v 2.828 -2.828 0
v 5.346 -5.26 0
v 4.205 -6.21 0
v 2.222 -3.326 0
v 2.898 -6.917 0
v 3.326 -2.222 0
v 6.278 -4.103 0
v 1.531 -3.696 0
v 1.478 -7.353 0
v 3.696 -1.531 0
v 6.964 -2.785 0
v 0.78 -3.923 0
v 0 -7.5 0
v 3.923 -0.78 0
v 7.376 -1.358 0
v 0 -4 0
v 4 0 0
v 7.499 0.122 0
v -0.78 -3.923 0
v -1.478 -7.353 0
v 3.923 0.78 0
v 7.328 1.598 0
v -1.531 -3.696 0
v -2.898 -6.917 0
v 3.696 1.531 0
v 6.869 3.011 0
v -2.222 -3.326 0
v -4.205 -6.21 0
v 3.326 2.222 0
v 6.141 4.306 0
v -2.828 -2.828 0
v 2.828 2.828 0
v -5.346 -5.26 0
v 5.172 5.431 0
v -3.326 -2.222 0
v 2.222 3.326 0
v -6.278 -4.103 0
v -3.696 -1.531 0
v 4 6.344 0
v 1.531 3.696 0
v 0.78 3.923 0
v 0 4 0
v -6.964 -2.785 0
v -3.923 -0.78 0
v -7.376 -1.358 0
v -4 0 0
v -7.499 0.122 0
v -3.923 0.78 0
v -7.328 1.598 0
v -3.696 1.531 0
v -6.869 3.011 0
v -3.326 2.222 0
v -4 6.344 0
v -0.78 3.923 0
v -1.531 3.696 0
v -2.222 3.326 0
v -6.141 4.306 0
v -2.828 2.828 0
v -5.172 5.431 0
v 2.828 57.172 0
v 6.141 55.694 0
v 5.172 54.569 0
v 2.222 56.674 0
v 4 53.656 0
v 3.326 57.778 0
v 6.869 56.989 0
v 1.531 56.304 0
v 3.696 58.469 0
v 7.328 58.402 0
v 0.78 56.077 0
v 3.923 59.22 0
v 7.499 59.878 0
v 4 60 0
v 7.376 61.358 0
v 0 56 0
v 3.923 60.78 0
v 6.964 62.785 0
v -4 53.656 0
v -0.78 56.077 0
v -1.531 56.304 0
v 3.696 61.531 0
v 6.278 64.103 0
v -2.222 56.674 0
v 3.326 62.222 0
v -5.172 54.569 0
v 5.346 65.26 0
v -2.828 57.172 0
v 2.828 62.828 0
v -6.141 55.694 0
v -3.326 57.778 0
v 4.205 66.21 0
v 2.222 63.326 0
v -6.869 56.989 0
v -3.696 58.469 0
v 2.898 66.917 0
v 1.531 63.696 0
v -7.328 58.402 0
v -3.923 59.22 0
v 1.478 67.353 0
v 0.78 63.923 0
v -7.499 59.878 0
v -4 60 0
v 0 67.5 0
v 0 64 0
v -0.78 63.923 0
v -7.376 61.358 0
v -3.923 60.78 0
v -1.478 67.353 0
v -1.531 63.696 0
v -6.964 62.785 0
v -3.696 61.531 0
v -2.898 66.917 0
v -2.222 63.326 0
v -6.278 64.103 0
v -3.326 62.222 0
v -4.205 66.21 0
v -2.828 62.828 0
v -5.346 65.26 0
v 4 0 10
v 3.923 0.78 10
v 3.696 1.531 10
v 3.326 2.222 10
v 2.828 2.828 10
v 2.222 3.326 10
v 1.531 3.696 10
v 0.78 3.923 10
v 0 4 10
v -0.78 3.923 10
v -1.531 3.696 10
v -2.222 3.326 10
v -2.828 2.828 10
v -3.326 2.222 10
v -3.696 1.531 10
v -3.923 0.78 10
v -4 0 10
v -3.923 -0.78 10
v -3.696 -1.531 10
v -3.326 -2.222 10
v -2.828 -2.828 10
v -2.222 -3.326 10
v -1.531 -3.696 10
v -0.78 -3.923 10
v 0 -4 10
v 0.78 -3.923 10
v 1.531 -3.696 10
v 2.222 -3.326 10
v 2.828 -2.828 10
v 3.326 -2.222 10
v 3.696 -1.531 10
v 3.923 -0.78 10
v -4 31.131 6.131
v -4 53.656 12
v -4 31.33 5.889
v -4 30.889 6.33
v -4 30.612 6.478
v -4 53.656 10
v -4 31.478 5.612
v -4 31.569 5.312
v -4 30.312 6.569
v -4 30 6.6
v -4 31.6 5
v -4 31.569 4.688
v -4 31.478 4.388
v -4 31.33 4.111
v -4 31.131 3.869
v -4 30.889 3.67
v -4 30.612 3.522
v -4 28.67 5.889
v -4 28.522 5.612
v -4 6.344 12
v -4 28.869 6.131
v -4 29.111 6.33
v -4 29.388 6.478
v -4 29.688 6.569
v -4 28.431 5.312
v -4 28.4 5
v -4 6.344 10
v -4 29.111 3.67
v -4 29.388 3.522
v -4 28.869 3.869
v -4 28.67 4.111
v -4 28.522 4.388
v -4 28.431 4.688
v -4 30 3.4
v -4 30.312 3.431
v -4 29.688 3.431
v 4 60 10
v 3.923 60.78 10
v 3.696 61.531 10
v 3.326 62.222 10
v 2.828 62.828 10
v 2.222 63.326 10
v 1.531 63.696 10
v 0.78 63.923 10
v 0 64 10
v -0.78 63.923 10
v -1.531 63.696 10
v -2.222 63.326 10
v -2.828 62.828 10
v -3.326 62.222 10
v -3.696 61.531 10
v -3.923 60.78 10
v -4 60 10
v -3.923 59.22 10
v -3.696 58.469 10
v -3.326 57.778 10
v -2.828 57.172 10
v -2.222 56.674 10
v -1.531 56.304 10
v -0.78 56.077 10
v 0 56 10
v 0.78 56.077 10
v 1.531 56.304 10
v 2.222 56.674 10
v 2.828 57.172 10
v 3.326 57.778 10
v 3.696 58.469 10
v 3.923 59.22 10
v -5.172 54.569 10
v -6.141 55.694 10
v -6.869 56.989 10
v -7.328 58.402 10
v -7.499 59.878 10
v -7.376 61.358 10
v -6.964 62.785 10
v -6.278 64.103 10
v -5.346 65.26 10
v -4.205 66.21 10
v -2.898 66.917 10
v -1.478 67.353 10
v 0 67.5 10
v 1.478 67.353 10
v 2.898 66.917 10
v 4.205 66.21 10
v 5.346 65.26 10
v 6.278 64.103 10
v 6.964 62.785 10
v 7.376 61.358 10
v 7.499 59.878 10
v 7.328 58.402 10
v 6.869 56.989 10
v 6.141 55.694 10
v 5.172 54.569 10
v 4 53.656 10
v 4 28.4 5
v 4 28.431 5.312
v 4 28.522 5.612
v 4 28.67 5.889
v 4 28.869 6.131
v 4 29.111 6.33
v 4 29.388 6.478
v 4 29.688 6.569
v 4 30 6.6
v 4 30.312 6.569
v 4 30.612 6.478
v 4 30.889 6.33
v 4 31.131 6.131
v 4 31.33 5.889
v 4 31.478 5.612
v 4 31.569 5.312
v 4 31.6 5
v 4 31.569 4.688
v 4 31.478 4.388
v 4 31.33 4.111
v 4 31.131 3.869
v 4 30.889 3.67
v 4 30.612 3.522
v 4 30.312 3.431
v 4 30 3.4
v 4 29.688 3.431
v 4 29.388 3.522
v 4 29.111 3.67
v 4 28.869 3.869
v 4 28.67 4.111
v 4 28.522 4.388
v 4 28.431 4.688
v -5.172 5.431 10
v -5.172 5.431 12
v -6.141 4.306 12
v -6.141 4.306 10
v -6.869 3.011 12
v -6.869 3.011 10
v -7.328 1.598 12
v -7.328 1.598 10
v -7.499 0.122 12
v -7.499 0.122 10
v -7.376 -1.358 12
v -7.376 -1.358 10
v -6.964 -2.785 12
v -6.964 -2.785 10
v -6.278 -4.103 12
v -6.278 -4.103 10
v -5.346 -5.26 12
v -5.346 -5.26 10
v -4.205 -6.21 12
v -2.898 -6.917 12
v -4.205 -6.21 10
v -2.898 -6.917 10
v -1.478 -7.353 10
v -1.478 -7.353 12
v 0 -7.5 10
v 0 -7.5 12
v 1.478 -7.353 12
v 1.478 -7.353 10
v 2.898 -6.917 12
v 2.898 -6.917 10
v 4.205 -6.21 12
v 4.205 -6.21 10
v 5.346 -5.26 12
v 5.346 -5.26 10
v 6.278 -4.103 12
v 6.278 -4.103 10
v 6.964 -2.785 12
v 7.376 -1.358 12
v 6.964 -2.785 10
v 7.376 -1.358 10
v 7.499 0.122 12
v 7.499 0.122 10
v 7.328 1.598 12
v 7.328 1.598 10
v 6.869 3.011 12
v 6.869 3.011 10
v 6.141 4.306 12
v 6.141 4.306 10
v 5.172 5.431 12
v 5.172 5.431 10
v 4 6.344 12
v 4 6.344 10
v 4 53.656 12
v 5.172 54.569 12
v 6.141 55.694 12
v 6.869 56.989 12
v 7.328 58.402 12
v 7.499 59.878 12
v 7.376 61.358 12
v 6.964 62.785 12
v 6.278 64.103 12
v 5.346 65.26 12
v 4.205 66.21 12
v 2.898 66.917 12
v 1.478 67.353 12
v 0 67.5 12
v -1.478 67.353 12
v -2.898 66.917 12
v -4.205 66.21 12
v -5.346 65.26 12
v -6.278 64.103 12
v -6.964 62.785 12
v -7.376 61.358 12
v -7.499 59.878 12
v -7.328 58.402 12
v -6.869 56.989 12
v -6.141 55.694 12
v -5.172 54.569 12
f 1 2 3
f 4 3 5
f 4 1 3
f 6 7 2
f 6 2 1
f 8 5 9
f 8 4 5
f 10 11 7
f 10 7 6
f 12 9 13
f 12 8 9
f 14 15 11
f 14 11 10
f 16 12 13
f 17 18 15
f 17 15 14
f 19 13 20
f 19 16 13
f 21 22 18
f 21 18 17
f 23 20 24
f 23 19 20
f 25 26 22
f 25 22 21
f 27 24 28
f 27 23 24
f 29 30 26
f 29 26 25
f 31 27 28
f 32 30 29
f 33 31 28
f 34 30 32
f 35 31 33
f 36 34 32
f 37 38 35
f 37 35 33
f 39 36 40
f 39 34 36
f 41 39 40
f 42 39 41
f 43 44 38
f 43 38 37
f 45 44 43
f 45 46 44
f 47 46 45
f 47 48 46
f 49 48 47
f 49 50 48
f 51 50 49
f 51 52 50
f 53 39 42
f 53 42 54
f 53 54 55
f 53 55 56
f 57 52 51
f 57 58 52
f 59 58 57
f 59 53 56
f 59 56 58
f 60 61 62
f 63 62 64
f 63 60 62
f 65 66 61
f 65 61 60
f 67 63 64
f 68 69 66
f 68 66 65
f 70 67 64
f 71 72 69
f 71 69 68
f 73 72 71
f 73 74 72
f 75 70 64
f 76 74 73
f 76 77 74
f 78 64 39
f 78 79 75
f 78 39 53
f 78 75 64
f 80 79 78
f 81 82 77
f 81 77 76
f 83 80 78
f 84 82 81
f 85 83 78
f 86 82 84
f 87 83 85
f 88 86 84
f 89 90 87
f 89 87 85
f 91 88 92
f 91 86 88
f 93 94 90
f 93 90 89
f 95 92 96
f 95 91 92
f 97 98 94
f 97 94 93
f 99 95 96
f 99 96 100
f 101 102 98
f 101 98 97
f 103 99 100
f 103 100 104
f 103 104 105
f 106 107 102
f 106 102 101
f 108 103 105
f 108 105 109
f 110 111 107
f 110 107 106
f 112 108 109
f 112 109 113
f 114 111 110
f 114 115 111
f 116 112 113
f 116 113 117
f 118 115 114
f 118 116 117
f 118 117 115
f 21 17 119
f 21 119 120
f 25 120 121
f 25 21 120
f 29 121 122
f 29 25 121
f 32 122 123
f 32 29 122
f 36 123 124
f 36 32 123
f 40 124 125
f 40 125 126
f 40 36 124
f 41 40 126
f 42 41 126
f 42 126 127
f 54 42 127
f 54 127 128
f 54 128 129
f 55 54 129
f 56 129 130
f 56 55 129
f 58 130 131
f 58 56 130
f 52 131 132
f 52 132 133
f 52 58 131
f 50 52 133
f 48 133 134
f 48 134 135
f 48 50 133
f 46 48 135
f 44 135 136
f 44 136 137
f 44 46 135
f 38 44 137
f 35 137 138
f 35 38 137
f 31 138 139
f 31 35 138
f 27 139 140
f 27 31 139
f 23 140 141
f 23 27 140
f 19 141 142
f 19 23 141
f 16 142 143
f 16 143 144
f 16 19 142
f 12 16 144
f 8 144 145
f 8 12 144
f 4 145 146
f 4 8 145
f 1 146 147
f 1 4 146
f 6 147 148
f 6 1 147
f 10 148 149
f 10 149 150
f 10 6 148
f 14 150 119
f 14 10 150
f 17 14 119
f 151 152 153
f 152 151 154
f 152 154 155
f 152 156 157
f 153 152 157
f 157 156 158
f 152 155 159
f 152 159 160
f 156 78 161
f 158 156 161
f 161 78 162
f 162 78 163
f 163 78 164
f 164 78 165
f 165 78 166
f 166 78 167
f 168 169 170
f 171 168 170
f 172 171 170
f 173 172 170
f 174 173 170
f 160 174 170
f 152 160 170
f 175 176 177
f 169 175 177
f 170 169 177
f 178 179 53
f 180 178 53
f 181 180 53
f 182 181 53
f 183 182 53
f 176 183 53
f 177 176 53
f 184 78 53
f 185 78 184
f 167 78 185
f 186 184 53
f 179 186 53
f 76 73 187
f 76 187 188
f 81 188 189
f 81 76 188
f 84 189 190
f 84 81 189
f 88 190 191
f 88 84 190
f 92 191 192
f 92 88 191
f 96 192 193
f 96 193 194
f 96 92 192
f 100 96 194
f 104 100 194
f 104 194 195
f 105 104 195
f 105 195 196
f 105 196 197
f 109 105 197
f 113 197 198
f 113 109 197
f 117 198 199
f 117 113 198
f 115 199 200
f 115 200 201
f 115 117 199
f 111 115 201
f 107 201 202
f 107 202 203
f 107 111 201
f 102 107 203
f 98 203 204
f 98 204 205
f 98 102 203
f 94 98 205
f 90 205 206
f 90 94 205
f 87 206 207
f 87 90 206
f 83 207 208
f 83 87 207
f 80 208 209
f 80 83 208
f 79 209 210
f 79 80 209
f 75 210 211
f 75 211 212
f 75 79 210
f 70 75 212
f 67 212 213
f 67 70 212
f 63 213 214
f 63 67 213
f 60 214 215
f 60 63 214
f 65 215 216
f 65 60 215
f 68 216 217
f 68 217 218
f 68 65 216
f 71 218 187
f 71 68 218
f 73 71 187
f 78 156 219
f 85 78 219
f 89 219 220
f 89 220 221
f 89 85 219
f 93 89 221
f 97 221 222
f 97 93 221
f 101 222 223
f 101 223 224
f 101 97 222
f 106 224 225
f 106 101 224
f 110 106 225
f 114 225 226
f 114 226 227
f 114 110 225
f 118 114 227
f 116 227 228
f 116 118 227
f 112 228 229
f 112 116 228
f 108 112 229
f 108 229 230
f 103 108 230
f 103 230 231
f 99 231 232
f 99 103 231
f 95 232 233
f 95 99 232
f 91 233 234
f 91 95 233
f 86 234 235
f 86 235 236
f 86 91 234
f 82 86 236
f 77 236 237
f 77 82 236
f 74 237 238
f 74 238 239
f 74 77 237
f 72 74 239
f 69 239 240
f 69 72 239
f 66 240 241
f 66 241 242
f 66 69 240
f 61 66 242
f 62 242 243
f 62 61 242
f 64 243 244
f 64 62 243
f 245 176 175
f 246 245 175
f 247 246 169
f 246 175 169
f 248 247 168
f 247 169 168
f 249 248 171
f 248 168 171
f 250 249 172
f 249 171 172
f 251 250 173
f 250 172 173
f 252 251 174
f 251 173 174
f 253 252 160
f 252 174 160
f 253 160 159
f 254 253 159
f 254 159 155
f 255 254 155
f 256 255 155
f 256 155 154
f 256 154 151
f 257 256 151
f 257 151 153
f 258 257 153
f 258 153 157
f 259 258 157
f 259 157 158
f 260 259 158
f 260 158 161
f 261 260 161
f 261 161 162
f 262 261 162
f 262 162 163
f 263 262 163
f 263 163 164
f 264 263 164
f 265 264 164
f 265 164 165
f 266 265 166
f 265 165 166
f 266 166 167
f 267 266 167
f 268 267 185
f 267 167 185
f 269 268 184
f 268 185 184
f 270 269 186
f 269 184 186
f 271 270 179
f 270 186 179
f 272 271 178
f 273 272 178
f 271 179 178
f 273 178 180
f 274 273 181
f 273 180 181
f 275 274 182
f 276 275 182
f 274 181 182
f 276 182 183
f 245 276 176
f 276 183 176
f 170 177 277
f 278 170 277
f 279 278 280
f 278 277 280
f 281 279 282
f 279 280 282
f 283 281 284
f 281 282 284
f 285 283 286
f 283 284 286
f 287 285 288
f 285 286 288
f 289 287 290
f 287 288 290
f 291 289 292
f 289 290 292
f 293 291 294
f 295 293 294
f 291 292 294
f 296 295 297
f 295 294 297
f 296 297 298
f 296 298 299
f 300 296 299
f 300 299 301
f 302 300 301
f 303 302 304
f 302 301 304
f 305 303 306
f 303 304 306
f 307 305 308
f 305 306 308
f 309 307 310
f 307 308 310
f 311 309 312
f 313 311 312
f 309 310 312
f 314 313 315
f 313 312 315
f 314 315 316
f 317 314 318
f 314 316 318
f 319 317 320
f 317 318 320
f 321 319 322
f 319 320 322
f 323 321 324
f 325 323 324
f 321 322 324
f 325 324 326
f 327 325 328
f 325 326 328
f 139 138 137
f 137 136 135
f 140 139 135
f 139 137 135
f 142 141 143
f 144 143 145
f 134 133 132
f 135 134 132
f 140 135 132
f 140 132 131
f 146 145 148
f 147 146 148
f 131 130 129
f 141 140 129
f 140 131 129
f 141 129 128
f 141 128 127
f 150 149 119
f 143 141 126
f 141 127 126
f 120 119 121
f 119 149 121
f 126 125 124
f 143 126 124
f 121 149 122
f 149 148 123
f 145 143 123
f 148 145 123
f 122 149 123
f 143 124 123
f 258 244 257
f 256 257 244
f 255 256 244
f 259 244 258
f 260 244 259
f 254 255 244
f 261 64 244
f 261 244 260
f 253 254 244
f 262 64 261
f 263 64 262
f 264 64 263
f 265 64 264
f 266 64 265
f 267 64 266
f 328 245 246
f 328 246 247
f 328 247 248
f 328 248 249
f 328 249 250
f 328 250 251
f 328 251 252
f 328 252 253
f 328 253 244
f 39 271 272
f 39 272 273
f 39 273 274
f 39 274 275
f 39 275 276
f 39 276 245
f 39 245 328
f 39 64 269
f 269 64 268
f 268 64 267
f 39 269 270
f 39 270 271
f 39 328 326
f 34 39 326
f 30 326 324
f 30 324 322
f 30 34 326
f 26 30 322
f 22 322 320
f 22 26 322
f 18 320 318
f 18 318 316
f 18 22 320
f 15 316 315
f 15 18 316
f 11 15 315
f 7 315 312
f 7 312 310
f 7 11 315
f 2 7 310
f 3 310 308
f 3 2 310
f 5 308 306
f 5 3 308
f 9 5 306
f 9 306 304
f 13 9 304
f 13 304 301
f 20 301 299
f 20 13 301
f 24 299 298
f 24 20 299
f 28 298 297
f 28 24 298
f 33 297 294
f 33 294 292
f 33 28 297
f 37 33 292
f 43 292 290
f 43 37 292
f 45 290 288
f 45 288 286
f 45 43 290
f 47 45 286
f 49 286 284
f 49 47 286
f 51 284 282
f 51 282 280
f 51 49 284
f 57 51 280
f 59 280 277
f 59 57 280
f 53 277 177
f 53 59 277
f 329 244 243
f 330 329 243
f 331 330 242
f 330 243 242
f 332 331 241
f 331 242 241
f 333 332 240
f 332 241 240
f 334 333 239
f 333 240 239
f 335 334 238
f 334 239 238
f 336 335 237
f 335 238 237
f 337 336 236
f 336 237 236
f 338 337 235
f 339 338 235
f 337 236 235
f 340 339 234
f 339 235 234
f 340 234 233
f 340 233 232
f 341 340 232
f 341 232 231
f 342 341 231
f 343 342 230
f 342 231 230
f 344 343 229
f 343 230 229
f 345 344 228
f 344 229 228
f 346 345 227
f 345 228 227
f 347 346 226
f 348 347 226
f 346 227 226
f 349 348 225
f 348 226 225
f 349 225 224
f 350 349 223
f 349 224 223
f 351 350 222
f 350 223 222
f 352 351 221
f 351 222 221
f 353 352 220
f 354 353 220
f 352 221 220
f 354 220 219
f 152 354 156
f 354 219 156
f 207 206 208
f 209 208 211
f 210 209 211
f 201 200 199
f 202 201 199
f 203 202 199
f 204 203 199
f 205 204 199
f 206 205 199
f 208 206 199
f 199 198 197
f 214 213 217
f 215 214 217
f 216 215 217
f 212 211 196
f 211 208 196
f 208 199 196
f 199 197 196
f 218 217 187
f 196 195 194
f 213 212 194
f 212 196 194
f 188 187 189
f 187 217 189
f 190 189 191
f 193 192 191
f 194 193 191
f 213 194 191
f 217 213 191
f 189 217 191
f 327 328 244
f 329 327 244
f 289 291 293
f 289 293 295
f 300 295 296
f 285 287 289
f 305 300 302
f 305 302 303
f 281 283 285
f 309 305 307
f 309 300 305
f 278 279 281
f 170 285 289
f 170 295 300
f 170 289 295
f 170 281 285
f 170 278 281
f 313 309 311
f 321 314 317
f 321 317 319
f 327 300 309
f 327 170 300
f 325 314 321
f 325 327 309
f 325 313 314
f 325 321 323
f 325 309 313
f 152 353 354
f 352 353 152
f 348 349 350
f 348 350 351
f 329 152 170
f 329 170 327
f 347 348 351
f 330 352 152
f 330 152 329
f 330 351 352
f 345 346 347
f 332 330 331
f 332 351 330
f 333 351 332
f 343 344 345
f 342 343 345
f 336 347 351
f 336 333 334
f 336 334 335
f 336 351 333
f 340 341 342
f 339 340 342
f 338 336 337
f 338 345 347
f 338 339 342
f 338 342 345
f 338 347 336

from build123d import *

# Parameters (mm, degrees)
ESBO_O1_R                = 4
RESSALTO_EXTRUS_O1_DEPTH = 10
ESBO_O2_R                = 1.6
CORTE_EXTRUS_O1_DEPTH    = 10
RESSALTO_EXTRUS_O2_DEPTH = 2


with BuildPart() as part:
    # Esboço1 → Ressalto-extrusão1 (new body)
    with BuildSketch(Plane.XY):
        with BuildLine():
            Line((4, 53.65571123), (4, 6.34428877))
            ThreePointArc((4, 6.34428877), (0, -7.5), (-4, 6.34428877))
            Line((-4, 6.34428877), (-4, 53.65571123))
            ThreePointArc((-4, 53.65571123), (0, 67.5), (4, 53.65571123))
        make_face()
        with Locations((0, 60)):
            Circle(ESBO_O1_R, mode=Mode.SUBTRACT)
        Circle(ESBO_O1_R, mode=Mode.SUBTRACT)
    extrude(amount=RESSALTO_EXTRUS_O1_DEPTH)

    # Esboço2 → Corte-extrusão1 (cut)
    with BuildSketch(Plane.ZY.offset(4)):
        with Locations(Location((5, 30, 0), (0, 0, 270))):
            Circle(ESBO_O2_R)
    extrude(amount=-CORTE_EXTRUS_O1_DEPTH, mode=Mode.SUBTRACT)

    # Esboço3 → Ressalto-extrusão2 (add)
    with BuildSketch(Plane.XY.offset(10)):
        with BuildLine():
            Line((-4, 53.65571123), (-4, 6.34428877))
            ThreePointArc((-4, 6.34428877), (0, -7.5), (4, 6.34428877))
            Line((4, 6.34428877), (4, 53.65571123))
            ThreePointArc((4, 53.65571123), (0, 67.5), (-4, 53.65571123))
        make_face()
    extrude(amount=RESSALTO_EXTRUS_O2_DEPTH)


solid = part.part
